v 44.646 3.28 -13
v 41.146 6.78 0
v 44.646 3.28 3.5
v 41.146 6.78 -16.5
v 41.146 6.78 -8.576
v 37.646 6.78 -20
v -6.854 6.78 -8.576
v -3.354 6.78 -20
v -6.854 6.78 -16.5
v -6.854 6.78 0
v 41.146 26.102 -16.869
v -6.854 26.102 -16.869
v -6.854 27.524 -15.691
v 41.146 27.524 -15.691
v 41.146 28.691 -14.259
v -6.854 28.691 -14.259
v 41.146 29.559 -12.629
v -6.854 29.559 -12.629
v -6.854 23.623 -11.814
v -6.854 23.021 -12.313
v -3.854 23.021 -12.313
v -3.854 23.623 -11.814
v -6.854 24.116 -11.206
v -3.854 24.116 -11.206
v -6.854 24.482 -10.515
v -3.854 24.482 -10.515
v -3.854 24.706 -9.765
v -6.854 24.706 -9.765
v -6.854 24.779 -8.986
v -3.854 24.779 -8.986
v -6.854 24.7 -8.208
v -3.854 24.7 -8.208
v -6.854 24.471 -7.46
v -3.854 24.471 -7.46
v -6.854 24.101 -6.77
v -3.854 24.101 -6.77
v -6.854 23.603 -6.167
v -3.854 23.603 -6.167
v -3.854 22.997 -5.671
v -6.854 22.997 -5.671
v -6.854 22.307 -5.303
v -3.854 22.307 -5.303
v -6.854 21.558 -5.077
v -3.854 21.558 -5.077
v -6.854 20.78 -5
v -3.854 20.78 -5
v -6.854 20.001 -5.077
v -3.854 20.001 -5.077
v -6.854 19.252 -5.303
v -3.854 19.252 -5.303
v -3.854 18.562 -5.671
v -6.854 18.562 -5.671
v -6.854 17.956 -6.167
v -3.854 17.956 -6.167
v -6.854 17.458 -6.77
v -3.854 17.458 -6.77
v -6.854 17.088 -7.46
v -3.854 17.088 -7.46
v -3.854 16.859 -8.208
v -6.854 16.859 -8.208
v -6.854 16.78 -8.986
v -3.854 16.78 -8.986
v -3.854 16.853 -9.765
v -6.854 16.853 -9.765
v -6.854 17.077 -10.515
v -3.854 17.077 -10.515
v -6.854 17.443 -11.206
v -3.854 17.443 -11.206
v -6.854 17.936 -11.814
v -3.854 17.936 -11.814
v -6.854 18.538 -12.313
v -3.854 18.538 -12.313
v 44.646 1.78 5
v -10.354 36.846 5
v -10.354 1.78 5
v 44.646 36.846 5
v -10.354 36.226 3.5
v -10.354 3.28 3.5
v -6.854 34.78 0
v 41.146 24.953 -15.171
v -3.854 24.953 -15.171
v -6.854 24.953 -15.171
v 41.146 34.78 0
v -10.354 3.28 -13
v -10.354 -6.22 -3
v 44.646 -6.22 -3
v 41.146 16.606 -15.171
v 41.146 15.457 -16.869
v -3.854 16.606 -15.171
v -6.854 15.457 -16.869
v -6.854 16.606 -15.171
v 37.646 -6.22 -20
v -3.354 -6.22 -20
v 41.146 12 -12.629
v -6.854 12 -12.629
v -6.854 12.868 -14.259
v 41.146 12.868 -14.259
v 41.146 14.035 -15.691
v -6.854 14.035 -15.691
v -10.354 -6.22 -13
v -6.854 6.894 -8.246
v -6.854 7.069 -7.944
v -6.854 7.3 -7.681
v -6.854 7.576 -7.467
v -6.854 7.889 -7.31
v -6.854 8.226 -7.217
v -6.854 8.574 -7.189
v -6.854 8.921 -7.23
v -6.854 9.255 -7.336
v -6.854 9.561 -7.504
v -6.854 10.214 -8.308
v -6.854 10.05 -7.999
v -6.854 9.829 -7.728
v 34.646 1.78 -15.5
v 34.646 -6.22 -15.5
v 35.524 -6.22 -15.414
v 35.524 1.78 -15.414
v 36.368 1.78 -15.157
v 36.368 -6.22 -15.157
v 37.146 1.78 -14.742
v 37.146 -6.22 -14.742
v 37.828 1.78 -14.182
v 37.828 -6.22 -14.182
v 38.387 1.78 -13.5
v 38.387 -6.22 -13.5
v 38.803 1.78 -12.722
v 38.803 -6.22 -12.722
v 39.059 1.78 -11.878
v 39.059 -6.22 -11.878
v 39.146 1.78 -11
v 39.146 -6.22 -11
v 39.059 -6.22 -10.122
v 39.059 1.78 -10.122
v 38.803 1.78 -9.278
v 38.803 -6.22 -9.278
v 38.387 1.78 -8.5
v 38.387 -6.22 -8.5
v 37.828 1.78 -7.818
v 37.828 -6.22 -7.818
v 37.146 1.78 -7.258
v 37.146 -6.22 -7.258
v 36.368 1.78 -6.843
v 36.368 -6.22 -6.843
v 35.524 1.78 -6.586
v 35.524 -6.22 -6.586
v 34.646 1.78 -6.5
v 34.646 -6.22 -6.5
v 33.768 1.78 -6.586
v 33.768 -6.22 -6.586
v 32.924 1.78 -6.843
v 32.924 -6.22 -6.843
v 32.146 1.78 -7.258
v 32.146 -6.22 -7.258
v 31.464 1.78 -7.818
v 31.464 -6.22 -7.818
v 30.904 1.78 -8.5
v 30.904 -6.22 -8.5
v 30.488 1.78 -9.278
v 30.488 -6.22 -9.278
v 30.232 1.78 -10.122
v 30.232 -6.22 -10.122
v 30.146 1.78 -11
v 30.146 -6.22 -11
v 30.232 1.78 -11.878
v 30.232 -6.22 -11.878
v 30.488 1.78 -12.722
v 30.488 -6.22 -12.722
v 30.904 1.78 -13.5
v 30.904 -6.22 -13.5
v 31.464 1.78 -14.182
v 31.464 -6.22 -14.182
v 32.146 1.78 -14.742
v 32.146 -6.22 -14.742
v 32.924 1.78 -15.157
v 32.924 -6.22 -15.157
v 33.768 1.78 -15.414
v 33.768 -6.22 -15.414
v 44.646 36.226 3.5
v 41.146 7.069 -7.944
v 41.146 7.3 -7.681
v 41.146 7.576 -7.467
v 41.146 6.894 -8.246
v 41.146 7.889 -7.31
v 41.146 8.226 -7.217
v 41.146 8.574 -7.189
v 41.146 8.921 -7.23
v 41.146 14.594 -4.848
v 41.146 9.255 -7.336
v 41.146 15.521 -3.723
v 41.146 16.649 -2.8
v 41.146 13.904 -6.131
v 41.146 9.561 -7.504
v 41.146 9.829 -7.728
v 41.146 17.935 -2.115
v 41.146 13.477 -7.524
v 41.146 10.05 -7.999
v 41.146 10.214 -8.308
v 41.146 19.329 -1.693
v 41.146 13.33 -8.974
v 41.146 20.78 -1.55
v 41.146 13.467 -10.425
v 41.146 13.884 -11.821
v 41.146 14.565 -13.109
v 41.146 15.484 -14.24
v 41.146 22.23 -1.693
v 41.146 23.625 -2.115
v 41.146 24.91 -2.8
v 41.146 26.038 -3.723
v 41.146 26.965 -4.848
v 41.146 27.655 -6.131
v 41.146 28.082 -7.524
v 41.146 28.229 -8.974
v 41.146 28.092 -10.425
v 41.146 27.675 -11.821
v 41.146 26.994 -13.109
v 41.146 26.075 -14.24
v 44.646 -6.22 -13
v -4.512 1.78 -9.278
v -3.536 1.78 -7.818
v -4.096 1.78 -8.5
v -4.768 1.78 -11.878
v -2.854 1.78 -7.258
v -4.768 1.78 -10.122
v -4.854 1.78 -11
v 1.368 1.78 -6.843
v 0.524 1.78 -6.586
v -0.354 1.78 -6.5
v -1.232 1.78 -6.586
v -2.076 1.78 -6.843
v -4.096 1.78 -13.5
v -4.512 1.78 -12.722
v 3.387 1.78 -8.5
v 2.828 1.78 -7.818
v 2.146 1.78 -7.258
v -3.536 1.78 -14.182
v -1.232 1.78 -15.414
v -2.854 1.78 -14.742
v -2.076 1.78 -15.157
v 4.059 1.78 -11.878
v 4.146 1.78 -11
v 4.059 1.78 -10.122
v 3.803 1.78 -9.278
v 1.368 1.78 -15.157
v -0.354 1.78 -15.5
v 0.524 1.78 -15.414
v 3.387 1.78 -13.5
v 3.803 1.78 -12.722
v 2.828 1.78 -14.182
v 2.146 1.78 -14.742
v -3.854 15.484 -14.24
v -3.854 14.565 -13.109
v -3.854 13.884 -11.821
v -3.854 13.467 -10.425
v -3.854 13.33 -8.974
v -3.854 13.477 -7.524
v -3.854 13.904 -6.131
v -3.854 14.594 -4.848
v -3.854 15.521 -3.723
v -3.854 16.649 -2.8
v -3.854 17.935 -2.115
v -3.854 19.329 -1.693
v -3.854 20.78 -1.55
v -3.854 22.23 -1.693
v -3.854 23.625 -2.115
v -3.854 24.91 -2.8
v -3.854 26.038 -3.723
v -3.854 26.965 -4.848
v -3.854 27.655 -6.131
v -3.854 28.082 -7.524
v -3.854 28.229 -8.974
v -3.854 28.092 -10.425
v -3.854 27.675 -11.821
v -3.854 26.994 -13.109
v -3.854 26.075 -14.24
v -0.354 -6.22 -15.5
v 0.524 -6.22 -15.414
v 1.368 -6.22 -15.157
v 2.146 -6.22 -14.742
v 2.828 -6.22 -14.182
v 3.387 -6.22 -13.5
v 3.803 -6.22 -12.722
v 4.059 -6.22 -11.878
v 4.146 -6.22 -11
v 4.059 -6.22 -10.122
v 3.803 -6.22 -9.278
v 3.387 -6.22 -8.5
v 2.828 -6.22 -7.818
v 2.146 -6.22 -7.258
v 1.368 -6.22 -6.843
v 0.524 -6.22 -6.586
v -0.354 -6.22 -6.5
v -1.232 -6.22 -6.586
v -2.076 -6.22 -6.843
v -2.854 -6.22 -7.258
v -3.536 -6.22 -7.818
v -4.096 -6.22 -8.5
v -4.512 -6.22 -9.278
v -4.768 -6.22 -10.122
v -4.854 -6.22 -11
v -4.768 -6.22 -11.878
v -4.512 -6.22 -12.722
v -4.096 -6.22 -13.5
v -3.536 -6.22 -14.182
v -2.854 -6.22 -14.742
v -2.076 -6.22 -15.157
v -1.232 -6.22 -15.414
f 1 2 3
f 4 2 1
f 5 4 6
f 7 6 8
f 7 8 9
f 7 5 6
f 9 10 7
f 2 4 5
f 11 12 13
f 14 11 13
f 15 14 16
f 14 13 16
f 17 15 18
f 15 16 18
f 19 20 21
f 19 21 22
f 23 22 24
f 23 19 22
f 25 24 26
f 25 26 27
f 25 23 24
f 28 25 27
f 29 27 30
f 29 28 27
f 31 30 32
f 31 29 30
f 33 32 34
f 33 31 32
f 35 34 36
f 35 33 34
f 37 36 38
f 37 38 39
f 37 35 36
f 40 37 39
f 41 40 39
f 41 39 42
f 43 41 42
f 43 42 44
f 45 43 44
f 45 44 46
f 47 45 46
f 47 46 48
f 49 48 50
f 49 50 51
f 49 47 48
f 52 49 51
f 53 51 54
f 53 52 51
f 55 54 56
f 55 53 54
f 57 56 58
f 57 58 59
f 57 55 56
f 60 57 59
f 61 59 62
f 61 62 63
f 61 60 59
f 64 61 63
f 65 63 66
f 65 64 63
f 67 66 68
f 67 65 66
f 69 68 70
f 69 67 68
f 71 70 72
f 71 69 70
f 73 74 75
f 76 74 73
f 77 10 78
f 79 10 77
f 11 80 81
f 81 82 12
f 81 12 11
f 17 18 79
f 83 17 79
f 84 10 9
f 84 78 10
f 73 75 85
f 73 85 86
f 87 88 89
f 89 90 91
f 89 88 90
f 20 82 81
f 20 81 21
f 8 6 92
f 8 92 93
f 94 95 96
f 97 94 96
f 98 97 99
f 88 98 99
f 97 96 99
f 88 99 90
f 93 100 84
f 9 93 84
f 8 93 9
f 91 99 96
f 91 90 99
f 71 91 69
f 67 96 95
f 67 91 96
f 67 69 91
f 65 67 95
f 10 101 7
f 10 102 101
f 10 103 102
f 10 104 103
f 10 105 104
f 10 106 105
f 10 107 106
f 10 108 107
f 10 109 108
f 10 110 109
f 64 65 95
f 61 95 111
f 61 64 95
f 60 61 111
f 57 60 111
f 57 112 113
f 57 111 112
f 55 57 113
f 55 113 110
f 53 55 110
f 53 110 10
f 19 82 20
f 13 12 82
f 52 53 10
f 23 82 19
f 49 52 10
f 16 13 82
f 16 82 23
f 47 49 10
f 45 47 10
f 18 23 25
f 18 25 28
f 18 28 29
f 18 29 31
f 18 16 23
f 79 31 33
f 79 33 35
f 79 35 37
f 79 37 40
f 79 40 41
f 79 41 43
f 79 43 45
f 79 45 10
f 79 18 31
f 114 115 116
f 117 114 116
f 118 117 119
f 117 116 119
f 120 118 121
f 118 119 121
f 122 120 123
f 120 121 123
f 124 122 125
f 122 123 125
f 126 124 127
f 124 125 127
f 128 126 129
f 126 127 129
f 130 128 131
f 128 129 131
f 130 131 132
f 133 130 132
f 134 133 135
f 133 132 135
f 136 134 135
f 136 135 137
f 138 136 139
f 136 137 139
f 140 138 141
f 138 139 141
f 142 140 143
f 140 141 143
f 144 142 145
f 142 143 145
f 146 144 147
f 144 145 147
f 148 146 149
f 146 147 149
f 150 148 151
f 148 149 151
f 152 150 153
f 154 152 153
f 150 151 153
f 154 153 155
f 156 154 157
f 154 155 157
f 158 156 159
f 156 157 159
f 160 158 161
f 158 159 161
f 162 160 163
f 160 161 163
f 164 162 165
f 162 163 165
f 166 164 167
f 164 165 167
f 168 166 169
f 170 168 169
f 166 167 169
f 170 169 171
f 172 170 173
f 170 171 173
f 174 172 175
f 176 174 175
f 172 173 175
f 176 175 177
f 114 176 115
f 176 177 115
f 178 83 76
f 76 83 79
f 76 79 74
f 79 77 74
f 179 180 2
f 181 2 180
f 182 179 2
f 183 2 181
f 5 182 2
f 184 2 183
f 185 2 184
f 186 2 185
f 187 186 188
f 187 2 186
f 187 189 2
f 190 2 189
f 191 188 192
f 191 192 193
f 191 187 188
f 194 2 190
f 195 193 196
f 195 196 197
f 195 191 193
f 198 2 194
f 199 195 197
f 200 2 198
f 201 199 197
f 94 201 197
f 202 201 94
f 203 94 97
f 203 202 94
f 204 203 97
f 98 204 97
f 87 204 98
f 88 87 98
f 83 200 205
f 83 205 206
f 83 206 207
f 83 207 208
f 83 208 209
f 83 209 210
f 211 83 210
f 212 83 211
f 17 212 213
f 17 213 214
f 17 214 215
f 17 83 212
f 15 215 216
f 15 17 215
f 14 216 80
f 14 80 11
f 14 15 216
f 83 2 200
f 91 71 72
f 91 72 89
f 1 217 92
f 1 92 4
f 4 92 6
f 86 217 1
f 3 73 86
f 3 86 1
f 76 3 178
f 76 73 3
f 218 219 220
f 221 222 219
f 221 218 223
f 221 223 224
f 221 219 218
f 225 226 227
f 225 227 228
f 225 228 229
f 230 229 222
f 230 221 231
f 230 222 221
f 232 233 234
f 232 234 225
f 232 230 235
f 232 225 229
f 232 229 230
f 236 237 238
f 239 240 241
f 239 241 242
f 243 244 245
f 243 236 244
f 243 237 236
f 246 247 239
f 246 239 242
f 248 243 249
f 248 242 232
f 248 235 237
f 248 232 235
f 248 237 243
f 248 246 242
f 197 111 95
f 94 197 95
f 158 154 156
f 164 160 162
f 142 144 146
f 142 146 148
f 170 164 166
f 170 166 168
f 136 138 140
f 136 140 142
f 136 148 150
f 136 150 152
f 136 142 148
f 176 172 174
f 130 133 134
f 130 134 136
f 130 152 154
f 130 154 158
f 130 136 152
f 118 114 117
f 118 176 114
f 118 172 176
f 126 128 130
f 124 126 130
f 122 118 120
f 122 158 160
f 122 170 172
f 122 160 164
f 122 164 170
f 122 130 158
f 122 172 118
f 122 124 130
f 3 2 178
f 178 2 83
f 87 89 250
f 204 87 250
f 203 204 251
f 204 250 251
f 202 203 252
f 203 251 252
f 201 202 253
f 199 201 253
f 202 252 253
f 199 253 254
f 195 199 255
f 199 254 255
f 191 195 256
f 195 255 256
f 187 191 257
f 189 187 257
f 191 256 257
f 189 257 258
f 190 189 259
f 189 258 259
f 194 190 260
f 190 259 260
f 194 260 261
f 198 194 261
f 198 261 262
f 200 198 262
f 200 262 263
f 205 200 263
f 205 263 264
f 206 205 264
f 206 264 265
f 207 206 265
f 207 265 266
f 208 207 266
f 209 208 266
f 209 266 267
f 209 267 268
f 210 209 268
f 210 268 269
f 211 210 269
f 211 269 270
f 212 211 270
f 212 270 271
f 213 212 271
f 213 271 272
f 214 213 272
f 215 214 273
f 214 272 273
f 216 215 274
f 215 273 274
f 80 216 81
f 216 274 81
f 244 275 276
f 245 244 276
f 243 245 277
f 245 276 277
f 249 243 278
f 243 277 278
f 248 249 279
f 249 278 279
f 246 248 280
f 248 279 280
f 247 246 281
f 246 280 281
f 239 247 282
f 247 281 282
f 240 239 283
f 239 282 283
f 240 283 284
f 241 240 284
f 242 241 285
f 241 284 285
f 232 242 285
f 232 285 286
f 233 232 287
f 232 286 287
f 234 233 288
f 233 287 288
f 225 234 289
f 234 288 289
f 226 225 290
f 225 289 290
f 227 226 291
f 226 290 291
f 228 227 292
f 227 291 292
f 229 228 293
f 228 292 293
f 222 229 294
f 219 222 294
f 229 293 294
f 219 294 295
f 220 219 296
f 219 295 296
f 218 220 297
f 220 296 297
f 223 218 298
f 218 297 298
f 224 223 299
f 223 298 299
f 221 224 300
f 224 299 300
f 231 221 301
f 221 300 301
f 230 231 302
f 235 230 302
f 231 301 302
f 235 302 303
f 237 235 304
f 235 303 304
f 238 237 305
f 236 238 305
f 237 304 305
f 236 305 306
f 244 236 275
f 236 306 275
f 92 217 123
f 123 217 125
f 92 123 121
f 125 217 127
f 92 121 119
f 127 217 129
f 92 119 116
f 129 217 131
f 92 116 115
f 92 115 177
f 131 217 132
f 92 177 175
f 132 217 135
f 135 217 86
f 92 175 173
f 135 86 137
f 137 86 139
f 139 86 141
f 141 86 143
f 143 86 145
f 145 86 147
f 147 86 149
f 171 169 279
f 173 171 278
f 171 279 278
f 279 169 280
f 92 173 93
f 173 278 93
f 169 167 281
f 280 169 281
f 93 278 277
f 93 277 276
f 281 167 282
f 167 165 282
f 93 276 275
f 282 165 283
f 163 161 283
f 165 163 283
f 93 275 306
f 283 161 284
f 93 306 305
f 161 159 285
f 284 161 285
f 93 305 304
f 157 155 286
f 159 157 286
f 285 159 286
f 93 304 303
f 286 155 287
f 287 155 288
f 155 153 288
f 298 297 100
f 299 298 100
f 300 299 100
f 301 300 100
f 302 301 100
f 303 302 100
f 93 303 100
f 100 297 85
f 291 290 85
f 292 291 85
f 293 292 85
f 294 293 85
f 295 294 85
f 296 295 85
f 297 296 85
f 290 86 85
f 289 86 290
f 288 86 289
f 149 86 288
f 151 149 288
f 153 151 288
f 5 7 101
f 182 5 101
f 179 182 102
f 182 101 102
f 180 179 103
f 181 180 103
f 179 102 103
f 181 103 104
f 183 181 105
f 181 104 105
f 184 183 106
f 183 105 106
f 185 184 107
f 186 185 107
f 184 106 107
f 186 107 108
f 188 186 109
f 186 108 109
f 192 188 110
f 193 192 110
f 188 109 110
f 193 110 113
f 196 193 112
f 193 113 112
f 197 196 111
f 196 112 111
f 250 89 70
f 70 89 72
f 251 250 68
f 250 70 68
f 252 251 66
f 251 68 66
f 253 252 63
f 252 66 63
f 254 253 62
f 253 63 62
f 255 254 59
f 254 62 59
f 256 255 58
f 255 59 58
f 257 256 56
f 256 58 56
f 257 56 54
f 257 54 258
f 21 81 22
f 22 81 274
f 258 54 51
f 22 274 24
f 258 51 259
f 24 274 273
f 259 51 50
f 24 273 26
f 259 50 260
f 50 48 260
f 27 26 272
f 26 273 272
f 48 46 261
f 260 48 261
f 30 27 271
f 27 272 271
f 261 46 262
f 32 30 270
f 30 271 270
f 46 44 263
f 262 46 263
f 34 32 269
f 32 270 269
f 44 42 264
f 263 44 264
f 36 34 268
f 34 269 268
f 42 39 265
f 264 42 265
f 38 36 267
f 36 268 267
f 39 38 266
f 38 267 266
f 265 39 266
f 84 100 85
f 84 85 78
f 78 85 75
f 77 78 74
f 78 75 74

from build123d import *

# Parameters (mm, degrees)
SKETCH1_W           = 55
SKETCH1_H           = 45
BOSS_EXTRUDE1_DEPTH = 5
SKETCH3_W           = 55
SKETCH3_H           = 13
BOSS_EXTRUDE5_DEPTH = 20
CHAMFER1_SIZE       = 8
SKETCH5_R           = 4.5
CUT_EXTRUDE2_DEPTH  = 8
BOSS_EXTRUDE7_DEPTH = 48
CUT_EXTRUDE3_DEPTH  = 71.205777697
CHAMFER2_SIZE       = 3.5
CHAMFER3_SIZE       = 3.5
CHAMFER4_SIZE       = 7
BOSS_EXTRUDE8_DEPTH = 3


with BuildPart() as part:
    # Sketch1 → Boss-Extrude1 (new body)
    with BuildSketch(Plane.XY):
        with Locations((17.145774036, 16.279520652)):
            Rectangle(SKETCH1_W, SKETCH1_H)
    extrude(amount=BOSS_EXTRUDE1_DEPTH)

    # Sketch3 → Boss-Extrude5 (add)
    with BuildSketch(Plane(origin=(0, 0, 0), x_dir=(-1, 0, 0), z_dir=(0, 0, -1))):
        with Locations((-17.145774036, 0.279520652)):
            Rectangle(SKETCH3_W, SKETCH3_H)
    extrude(amount=BOSS_EXTRUDE5_DEPTH)

    # Chamfer1
    chamfer1_edges = [part.edges().sort_by_distance(p)[0] for p in [
        (17.145774036, -6.220479348, 5),
    ]]
    chamfer(chamfer1_edges, length=CHAMFER1_SIZE)

    # Sketch5 → Cut-Extrude2 (cut)
    with BuildSketch(Plane.XZ.offset(6.220479348)):
        with Locations(Location((-0.354225964, -11, 0), (0, 0, 270))):
            Circle(SKETCH5_R)
        with Locations(Location((34.645774036, -11, 0), (0, 0, 270))):
            Circle(SKETCH5_R)
    extrude(amount=-CUT_EXTRUDE2_DEPTH, mode=Mode.SUBTRACT)

    # Sketch7 → Boss-Extrude7 (add)
    with BuildSketch(Plane.ZY.offset(6.854225964)):
        with BuildLine():
            Line((-8.308177677, 10.21387745), (-12.629175087, 12.000050953))
            ThreePointArc((-12.629175087, 12.000050953), (-15.003318067, 13.416764905), (-16.86901604, 15.457060078))
            Line((-16.86901604, 15.457060078), (-15.17096521, 16.605591044))
            ThreePointArc((-15.17096521, 16.605591044), (-1.55, 20.779520652), (-15.17096521, 24.95345026))
            Line((-15.17096521, 24.95345026), (-16.86901604, 26.101981226))
            ThreePointArc((-16.86901604, 26.101981226), (-15.003318067, 28.142276398), (-12.629175087, 29.55899035))
            Line((-12.629175087, 29.55899035), (0, 34.779520652))
            Line((0, 34.779520652), (0, 6.779520652))
            Line((0, 6.779520652), (-8.576470695, 6.779520652))
            ThreePointArc((-8.576470695, 6.779520652), (-7.194534972, 8.39922137), (-8.308177677, 10.21387745))
        make_face()
    extrude(amount=-BOSS_EXTRUDE7_DEPTH)

    # Sketch8 → Cut-Extrude3 (cut, through all)
    with BuildSketch(Plane.ZY.offset(10.354225964)):
        Polygon((0, 34.779520652), (5, 36.846373896), (5, 38.779520652), (0, 38.779520652), align=None)
    extrude(amount=-CUT_EXTRUDE3_DEPTH, mode=Mode.SUBTRACT)

    # Chamfer2
    chamfer2_edges = [part.edges().sort_by_distance(p)[0] for p in [
        (-10.354225964, 6.779520652, -10),
        (-10.354225964, 20.779520652, 0),
    ]]
    chamfer(chamfer2_edges, length=CHAMFER2_SIZE - 0.0001)  # a hair under: the kernel refuses the full size

    # Chamfer3
    chamfer3_edges = [part.edges().sort_by_distance(p)[0] for p in [
        (44.645774036, 20.779520652, 0),
        (44.645774036, 6.779520652, -10),
    ]]
    chamfer(chamfer3_edges, length=CHAMFER3_SIZE - 0.0001)  # a hair under: the kernel refuses the full size

    # Chamfer4
    chamfer4_edges = [part.edges().sort_by_distance(p)[0] for p in [
        (44.645774036, -1.470429348, -20),
        (-10.354225964, -1.470429348, -20),
    ]]
    chamfer(chamfer4_edges, length=CHAMFER4_SIZE)

    # Sketch9 → Boss-Extrude8 (add)
    with BuildSketch(Plane.ZY.offset(6.854225964)):
        with BuildLine():
            Line((-15.17096521, 24.95345026), (-12.313269912, 23.020556683))
            ThreePointArc((-12.313269912, 23.020556683), (-5, 20.779520652), (-12.313269912, 18.538484621))
            Line((-12.313269912, 18.538484621), (-15.17096521, 16.605591044))
            ThreePointArc((-15.17096521, 16.605591044), (-1.55, 20.779520652), (-15.17096521, 24.95345026))
        make_face()
    extrude(amount=-BOSS_EXTRUDE8_DEPTH)


solid = part.part
